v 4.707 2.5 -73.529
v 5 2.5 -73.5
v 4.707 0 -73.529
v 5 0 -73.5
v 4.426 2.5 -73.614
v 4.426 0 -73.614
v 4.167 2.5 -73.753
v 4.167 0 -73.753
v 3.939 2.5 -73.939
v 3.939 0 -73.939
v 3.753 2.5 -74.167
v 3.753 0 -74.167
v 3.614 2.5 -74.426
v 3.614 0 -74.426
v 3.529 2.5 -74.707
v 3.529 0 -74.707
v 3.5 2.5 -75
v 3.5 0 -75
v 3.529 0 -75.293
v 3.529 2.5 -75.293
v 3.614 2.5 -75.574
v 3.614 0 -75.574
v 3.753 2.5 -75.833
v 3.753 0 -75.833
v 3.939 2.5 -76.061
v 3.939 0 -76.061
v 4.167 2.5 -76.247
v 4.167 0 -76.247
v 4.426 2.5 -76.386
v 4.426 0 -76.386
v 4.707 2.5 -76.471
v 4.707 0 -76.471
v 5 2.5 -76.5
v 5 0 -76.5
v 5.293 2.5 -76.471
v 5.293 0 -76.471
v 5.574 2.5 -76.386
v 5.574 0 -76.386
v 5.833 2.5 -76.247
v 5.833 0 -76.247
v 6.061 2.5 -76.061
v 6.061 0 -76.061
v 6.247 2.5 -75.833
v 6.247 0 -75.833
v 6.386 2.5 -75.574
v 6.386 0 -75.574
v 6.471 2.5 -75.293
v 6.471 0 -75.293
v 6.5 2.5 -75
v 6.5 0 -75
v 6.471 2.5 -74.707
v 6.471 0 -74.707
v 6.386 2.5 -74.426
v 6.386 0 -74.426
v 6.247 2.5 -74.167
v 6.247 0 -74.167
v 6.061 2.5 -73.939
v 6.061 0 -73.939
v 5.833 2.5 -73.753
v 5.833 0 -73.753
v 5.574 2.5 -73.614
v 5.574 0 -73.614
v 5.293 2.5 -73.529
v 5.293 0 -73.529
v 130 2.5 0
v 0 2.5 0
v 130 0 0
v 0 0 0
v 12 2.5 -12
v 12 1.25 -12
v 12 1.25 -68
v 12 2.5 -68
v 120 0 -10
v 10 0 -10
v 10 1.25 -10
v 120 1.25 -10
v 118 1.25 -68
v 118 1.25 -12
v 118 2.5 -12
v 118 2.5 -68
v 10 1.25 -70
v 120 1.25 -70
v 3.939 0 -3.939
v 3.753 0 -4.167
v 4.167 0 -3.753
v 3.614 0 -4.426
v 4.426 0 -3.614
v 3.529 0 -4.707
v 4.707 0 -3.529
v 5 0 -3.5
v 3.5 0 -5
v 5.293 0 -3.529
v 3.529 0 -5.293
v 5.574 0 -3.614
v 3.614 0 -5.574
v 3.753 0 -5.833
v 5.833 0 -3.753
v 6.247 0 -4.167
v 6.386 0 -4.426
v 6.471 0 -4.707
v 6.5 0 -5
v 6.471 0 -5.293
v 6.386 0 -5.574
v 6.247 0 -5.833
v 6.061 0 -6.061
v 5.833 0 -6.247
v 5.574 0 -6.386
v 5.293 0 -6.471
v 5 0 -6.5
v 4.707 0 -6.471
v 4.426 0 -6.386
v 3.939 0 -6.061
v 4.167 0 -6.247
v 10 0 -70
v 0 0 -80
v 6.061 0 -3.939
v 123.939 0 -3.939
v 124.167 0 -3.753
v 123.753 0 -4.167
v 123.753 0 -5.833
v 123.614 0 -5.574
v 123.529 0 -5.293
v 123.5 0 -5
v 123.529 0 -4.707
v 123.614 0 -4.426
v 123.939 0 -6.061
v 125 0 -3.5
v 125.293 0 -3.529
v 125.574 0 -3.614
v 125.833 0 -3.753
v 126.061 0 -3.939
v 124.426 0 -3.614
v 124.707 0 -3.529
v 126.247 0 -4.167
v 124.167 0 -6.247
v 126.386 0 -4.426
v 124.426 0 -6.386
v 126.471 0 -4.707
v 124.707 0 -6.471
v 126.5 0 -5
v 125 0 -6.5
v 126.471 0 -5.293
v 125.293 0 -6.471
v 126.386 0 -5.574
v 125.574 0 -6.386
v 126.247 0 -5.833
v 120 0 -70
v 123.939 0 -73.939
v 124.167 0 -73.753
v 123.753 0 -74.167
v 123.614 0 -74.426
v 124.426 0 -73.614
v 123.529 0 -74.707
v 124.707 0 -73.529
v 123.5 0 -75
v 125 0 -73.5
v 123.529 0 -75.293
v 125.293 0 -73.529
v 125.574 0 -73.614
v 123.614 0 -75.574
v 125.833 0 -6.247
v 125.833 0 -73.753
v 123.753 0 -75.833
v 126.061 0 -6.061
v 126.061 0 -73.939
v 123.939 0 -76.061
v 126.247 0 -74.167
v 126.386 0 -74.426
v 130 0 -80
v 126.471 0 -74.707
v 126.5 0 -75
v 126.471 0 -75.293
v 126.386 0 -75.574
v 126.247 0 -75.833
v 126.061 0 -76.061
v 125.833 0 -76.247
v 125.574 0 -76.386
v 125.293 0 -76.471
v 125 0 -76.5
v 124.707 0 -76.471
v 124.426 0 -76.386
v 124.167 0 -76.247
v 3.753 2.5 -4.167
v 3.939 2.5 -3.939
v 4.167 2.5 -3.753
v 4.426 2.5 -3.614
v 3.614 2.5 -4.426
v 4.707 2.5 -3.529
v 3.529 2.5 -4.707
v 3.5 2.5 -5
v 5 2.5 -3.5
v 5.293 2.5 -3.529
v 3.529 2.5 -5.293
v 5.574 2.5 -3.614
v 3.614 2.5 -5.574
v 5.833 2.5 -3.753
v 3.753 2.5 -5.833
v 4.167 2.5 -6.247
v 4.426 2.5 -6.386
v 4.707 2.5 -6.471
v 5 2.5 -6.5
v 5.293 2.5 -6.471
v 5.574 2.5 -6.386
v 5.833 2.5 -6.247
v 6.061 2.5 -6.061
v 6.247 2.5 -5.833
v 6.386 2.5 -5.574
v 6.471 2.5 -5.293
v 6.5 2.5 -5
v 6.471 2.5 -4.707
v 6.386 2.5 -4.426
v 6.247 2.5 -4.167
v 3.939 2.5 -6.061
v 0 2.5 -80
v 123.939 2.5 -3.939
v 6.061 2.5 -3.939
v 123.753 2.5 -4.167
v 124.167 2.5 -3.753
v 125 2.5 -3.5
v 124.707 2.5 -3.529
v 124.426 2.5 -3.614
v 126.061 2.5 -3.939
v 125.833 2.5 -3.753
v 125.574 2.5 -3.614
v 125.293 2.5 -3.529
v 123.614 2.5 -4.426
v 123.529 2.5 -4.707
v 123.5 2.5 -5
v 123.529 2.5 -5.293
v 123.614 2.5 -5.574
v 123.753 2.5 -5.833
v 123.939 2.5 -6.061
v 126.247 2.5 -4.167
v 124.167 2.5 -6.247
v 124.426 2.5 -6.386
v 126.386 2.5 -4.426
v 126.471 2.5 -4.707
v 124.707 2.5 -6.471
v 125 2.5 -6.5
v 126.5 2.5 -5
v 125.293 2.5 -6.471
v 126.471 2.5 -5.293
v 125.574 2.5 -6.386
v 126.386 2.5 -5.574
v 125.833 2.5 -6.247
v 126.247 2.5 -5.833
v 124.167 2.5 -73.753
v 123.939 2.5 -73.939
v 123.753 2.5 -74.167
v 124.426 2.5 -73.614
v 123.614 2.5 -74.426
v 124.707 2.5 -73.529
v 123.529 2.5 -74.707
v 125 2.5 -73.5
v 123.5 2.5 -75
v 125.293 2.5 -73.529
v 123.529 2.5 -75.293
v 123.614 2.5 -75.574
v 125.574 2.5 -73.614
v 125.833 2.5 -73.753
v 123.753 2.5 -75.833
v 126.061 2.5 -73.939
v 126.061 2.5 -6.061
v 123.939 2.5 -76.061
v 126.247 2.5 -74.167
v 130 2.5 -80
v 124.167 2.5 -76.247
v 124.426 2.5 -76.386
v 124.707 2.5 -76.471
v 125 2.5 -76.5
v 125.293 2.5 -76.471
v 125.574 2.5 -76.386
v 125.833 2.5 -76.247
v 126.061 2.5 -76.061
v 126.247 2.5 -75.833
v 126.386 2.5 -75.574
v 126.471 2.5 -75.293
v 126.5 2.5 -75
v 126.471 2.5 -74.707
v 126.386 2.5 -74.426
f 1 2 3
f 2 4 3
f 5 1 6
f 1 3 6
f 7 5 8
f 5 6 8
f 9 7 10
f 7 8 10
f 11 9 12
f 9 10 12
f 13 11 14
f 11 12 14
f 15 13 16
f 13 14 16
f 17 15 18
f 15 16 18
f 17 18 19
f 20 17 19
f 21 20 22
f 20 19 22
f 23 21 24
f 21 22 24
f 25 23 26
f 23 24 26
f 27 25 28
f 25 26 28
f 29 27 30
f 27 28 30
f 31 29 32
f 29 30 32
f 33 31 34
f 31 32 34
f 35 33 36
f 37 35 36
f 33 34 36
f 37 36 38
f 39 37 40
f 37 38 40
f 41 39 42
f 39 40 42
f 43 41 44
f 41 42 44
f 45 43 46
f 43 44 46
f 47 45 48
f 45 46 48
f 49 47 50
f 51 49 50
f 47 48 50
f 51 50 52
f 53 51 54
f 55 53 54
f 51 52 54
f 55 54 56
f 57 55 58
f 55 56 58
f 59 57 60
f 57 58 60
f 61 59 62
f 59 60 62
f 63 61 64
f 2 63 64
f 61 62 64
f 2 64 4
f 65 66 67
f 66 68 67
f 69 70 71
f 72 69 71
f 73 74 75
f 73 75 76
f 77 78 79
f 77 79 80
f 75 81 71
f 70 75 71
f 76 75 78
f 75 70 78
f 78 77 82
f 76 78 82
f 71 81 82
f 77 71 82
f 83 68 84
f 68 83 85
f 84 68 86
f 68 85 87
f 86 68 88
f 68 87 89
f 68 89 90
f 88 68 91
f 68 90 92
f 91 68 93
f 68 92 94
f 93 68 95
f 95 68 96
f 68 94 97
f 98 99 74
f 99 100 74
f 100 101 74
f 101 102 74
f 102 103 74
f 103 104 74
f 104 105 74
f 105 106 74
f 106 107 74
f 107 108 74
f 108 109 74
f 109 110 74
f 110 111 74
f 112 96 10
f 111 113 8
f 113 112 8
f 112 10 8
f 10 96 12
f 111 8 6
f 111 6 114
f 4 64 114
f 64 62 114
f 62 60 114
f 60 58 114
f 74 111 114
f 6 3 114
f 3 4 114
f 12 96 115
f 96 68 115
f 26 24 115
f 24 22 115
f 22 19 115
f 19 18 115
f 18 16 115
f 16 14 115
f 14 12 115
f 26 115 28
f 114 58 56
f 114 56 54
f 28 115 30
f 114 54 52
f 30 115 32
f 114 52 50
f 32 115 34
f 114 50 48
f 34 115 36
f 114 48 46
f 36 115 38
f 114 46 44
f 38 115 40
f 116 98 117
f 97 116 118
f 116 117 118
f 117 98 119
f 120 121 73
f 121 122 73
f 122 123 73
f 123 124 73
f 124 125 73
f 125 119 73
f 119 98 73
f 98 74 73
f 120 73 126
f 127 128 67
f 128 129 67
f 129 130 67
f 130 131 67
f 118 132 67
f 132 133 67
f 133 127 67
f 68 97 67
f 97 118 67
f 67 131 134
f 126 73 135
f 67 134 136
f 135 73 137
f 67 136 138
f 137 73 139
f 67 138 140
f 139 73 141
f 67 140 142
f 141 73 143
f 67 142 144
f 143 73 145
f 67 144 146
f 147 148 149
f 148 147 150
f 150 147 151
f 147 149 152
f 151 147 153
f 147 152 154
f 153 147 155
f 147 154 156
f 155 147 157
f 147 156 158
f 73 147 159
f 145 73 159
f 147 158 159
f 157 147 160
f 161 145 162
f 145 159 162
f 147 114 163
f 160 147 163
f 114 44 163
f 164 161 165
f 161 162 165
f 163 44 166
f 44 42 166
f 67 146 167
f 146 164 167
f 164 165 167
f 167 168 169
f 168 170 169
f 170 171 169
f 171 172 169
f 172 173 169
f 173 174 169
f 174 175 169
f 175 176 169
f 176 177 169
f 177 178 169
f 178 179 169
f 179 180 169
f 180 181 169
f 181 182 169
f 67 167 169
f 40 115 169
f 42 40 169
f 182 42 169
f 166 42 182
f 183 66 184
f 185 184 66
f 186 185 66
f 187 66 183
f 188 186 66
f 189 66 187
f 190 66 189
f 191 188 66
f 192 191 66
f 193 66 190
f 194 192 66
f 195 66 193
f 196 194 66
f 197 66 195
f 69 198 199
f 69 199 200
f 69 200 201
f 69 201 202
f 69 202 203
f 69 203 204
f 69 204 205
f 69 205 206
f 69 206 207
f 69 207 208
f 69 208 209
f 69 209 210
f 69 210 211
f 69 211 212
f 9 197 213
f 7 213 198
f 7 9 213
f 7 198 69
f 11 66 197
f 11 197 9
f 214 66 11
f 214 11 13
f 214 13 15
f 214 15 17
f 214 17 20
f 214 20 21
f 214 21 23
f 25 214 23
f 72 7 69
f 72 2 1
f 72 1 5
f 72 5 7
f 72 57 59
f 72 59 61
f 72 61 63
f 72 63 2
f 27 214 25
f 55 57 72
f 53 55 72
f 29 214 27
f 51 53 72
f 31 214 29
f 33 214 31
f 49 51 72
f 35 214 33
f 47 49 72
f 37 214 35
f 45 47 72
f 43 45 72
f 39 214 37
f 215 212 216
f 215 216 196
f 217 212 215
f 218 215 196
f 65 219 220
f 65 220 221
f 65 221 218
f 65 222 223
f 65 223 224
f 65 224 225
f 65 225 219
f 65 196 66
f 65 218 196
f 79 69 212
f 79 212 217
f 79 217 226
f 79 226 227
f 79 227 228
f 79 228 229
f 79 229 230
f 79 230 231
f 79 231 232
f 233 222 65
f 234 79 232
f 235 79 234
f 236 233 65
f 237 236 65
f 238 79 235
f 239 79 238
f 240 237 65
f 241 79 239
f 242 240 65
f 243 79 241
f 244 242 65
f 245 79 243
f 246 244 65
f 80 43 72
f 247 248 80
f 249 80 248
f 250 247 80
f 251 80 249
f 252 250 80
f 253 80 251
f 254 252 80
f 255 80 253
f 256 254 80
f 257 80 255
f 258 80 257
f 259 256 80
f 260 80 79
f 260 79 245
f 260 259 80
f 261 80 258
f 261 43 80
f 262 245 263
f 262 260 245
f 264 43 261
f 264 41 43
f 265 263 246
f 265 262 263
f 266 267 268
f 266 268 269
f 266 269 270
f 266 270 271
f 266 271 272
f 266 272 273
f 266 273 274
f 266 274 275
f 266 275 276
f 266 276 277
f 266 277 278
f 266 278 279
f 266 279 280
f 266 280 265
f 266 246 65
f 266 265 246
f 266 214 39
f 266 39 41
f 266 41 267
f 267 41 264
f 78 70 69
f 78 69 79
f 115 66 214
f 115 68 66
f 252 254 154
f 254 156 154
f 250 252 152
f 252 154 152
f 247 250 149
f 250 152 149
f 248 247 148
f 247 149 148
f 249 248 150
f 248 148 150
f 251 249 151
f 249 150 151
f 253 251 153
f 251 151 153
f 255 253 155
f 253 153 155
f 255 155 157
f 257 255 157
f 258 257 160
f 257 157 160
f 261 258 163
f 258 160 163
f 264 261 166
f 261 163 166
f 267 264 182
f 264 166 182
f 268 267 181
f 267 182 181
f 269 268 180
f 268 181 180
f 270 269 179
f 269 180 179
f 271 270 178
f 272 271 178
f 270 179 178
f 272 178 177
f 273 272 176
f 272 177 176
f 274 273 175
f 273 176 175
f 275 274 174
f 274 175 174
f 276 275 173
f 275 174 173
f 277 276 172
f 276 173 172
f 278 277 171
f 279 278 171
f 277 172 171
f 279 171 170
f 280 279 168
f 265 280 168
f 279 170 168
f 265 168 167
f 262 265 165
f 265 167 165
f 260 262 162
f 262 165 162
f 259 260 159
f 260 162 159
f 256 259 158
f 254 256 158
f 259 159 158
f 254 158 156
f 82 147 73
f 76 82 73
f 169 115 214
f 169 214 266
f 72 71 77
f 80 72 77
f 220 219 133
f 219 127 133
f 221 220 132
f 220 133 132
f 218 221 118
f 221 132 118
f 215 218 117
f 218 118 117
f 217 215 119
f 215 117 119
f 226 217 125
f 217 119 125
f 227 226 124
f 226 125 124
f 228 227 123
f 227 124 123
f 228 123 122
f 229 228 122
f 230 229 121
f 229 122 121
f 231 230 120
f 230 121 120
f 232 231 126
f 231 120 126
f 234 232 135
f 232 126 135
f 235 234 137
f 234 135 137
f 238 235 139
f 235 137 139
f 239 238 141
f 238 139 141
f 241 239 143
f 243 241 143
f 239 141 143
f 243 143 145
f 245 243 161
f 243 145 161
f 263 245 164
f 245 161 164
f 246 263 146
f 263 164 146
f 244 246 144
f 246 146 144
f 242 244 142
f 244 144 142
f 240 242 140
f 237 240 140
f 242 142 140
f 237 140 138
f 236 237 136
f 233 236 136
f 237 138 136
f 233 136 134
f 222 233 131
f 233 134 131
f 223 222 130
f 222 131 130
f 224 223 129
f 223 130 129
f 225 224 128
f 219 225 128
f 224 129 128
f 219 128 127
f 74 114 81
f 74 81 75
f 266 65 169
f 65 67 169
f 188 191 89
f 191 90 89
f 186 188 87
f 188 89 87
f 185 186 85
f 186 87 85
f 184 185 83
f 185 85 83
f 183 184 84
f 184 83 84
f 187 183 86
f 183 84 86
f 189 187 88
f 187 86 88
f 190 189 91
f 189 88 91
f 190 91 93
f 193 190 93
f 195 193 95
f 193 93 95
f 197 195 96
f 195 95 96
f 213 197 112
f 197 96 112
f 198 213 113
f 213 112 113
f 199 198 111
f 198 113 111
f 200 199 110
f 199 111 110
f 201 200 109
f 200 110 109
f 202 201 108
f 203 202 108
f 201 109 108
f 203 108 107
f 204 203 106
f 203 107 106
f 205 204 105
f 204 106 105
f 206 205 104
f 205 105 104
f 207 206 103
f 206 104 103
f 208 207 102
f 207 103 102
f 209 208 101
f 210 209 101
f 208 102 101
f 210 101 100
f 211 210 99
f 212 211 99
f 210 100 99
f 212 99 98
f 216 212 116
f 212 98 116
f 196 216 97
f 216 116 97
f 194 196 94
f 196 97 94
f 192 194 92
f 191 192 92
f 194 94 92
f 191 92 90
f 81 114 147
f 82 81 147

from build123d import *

# Parameters (mm, degrees)
SKETCH1_W           = 130
SKETCH1_H           = 80
BOSS_EXTRUDE1_DEPTH = 1.25
SKETCH2_W           = 110
SKETCH2_H           = 60
CUT_EXTRUDE1_DEPTH  = 153.648493278
SKETCH3_R           = 1.5
CUT_EXTRUDE2_DEPTH  = 153.648493278
SKETCH6_W           = 130
SKETCH6_H           = 80
SKETCH6_W_2         = 106
SKETCH6_H_2         = 56
BOSS_EXTRUDE2_DEPTH = 1.25
SKETCH7_R           = 1.5
CUT_EXTRUDE4_DEPTH  = 153.648493278


with BuildPart() as part:
    # Sketch1 → Boss-Extrude1 (new body)
    with BuildSketch(Plane(origin=(0, 0, 0), x_dir=(1, 0, 0), z_dir=(0, 1, 0))):
        with Locations((65, 40)):
            Rectangle(SKETCH1_W, SKETCH1_H)
    extrude(amount=BOSS_EXTRUDE1_DEPTH)

    # Sketch2 → Cut-Extrude1 (cut, through all)
    with BuildSketch(Plane.XZ):
        with Locations((65, -40)):
            Rectangle(SKETCH2_W, SKETCH2_H)
    extrude(amount=-CUT_EXTRUDE1_DEPTH, mode=Mode.SUBTRACT)

    # Sketch3 → Cut-Extrude2 (cut, through all)
    with BuildSketch(Plane(origin=(0, 1.25, 0), x_dir=(1, 0, 0), z_dir=(0, 1, 0))):
        with Locations(Location((5, 75, 0), (0, 0, 270))):
            Circle(SKETCH3_R)
        with Locations(Location((125, 75, 0), (0, 0, 270))):
            Circle(SKETCH3_R)
        with Locations(Location((125, 5, 0), (0, 0, 270))):
            Circle(SKETCH3_R)
        with Locations(Location((5, 5, 0), (0, 0, 270))):
            Circle(SKETCH3_R)
    extrude(amount=-CUT_EXTRUDE2_DEPTH, mode=Mode.SUBTRACT)

    # Sketch6 → Boss-Extrude2 (add)
    with BuildSketch(Plane(origin=(0, 1.25, 0), x_dir=(1, 0, 0), z_dir=(0, 1, 0))):
        with Locations((65, 40)):
            Rectangle(SKETCH6_W, SKETCH6_H)
        with Locations((65, 40)):
            Rectangle(SKETCH6_W_2, SKETCH6_H_2, mode=Mode.SUBTRACT)
    extrude(amount=BOSS_EXTRUDE2_DEPTH)

    # Sketch7 → Cut-Extrude4 (cut, through all)
    with BuildSketch(Plane.XZ.offset(-1.25)):
        with Locations(Location((5, -75, 0), (0, 0, 90))):
            Circle(SKETCH7_R)
        with Locations(Location((5, -5, 0), (0, 0, 90))):
            Circle(SKETCH7_R)
        with Locations(Location((125, -5, 0), (0, 0, 90))):
            Circle(SKETCH7_R)
        with Locations(Location((125, -75, 0), (0, 0, 90))):
            Circle(SKETCH7_R)
    extrude(amount=-CUT_EXTRUDE4_DEPTH, mode=Mode.SUBTRACT)


solid = part.part
